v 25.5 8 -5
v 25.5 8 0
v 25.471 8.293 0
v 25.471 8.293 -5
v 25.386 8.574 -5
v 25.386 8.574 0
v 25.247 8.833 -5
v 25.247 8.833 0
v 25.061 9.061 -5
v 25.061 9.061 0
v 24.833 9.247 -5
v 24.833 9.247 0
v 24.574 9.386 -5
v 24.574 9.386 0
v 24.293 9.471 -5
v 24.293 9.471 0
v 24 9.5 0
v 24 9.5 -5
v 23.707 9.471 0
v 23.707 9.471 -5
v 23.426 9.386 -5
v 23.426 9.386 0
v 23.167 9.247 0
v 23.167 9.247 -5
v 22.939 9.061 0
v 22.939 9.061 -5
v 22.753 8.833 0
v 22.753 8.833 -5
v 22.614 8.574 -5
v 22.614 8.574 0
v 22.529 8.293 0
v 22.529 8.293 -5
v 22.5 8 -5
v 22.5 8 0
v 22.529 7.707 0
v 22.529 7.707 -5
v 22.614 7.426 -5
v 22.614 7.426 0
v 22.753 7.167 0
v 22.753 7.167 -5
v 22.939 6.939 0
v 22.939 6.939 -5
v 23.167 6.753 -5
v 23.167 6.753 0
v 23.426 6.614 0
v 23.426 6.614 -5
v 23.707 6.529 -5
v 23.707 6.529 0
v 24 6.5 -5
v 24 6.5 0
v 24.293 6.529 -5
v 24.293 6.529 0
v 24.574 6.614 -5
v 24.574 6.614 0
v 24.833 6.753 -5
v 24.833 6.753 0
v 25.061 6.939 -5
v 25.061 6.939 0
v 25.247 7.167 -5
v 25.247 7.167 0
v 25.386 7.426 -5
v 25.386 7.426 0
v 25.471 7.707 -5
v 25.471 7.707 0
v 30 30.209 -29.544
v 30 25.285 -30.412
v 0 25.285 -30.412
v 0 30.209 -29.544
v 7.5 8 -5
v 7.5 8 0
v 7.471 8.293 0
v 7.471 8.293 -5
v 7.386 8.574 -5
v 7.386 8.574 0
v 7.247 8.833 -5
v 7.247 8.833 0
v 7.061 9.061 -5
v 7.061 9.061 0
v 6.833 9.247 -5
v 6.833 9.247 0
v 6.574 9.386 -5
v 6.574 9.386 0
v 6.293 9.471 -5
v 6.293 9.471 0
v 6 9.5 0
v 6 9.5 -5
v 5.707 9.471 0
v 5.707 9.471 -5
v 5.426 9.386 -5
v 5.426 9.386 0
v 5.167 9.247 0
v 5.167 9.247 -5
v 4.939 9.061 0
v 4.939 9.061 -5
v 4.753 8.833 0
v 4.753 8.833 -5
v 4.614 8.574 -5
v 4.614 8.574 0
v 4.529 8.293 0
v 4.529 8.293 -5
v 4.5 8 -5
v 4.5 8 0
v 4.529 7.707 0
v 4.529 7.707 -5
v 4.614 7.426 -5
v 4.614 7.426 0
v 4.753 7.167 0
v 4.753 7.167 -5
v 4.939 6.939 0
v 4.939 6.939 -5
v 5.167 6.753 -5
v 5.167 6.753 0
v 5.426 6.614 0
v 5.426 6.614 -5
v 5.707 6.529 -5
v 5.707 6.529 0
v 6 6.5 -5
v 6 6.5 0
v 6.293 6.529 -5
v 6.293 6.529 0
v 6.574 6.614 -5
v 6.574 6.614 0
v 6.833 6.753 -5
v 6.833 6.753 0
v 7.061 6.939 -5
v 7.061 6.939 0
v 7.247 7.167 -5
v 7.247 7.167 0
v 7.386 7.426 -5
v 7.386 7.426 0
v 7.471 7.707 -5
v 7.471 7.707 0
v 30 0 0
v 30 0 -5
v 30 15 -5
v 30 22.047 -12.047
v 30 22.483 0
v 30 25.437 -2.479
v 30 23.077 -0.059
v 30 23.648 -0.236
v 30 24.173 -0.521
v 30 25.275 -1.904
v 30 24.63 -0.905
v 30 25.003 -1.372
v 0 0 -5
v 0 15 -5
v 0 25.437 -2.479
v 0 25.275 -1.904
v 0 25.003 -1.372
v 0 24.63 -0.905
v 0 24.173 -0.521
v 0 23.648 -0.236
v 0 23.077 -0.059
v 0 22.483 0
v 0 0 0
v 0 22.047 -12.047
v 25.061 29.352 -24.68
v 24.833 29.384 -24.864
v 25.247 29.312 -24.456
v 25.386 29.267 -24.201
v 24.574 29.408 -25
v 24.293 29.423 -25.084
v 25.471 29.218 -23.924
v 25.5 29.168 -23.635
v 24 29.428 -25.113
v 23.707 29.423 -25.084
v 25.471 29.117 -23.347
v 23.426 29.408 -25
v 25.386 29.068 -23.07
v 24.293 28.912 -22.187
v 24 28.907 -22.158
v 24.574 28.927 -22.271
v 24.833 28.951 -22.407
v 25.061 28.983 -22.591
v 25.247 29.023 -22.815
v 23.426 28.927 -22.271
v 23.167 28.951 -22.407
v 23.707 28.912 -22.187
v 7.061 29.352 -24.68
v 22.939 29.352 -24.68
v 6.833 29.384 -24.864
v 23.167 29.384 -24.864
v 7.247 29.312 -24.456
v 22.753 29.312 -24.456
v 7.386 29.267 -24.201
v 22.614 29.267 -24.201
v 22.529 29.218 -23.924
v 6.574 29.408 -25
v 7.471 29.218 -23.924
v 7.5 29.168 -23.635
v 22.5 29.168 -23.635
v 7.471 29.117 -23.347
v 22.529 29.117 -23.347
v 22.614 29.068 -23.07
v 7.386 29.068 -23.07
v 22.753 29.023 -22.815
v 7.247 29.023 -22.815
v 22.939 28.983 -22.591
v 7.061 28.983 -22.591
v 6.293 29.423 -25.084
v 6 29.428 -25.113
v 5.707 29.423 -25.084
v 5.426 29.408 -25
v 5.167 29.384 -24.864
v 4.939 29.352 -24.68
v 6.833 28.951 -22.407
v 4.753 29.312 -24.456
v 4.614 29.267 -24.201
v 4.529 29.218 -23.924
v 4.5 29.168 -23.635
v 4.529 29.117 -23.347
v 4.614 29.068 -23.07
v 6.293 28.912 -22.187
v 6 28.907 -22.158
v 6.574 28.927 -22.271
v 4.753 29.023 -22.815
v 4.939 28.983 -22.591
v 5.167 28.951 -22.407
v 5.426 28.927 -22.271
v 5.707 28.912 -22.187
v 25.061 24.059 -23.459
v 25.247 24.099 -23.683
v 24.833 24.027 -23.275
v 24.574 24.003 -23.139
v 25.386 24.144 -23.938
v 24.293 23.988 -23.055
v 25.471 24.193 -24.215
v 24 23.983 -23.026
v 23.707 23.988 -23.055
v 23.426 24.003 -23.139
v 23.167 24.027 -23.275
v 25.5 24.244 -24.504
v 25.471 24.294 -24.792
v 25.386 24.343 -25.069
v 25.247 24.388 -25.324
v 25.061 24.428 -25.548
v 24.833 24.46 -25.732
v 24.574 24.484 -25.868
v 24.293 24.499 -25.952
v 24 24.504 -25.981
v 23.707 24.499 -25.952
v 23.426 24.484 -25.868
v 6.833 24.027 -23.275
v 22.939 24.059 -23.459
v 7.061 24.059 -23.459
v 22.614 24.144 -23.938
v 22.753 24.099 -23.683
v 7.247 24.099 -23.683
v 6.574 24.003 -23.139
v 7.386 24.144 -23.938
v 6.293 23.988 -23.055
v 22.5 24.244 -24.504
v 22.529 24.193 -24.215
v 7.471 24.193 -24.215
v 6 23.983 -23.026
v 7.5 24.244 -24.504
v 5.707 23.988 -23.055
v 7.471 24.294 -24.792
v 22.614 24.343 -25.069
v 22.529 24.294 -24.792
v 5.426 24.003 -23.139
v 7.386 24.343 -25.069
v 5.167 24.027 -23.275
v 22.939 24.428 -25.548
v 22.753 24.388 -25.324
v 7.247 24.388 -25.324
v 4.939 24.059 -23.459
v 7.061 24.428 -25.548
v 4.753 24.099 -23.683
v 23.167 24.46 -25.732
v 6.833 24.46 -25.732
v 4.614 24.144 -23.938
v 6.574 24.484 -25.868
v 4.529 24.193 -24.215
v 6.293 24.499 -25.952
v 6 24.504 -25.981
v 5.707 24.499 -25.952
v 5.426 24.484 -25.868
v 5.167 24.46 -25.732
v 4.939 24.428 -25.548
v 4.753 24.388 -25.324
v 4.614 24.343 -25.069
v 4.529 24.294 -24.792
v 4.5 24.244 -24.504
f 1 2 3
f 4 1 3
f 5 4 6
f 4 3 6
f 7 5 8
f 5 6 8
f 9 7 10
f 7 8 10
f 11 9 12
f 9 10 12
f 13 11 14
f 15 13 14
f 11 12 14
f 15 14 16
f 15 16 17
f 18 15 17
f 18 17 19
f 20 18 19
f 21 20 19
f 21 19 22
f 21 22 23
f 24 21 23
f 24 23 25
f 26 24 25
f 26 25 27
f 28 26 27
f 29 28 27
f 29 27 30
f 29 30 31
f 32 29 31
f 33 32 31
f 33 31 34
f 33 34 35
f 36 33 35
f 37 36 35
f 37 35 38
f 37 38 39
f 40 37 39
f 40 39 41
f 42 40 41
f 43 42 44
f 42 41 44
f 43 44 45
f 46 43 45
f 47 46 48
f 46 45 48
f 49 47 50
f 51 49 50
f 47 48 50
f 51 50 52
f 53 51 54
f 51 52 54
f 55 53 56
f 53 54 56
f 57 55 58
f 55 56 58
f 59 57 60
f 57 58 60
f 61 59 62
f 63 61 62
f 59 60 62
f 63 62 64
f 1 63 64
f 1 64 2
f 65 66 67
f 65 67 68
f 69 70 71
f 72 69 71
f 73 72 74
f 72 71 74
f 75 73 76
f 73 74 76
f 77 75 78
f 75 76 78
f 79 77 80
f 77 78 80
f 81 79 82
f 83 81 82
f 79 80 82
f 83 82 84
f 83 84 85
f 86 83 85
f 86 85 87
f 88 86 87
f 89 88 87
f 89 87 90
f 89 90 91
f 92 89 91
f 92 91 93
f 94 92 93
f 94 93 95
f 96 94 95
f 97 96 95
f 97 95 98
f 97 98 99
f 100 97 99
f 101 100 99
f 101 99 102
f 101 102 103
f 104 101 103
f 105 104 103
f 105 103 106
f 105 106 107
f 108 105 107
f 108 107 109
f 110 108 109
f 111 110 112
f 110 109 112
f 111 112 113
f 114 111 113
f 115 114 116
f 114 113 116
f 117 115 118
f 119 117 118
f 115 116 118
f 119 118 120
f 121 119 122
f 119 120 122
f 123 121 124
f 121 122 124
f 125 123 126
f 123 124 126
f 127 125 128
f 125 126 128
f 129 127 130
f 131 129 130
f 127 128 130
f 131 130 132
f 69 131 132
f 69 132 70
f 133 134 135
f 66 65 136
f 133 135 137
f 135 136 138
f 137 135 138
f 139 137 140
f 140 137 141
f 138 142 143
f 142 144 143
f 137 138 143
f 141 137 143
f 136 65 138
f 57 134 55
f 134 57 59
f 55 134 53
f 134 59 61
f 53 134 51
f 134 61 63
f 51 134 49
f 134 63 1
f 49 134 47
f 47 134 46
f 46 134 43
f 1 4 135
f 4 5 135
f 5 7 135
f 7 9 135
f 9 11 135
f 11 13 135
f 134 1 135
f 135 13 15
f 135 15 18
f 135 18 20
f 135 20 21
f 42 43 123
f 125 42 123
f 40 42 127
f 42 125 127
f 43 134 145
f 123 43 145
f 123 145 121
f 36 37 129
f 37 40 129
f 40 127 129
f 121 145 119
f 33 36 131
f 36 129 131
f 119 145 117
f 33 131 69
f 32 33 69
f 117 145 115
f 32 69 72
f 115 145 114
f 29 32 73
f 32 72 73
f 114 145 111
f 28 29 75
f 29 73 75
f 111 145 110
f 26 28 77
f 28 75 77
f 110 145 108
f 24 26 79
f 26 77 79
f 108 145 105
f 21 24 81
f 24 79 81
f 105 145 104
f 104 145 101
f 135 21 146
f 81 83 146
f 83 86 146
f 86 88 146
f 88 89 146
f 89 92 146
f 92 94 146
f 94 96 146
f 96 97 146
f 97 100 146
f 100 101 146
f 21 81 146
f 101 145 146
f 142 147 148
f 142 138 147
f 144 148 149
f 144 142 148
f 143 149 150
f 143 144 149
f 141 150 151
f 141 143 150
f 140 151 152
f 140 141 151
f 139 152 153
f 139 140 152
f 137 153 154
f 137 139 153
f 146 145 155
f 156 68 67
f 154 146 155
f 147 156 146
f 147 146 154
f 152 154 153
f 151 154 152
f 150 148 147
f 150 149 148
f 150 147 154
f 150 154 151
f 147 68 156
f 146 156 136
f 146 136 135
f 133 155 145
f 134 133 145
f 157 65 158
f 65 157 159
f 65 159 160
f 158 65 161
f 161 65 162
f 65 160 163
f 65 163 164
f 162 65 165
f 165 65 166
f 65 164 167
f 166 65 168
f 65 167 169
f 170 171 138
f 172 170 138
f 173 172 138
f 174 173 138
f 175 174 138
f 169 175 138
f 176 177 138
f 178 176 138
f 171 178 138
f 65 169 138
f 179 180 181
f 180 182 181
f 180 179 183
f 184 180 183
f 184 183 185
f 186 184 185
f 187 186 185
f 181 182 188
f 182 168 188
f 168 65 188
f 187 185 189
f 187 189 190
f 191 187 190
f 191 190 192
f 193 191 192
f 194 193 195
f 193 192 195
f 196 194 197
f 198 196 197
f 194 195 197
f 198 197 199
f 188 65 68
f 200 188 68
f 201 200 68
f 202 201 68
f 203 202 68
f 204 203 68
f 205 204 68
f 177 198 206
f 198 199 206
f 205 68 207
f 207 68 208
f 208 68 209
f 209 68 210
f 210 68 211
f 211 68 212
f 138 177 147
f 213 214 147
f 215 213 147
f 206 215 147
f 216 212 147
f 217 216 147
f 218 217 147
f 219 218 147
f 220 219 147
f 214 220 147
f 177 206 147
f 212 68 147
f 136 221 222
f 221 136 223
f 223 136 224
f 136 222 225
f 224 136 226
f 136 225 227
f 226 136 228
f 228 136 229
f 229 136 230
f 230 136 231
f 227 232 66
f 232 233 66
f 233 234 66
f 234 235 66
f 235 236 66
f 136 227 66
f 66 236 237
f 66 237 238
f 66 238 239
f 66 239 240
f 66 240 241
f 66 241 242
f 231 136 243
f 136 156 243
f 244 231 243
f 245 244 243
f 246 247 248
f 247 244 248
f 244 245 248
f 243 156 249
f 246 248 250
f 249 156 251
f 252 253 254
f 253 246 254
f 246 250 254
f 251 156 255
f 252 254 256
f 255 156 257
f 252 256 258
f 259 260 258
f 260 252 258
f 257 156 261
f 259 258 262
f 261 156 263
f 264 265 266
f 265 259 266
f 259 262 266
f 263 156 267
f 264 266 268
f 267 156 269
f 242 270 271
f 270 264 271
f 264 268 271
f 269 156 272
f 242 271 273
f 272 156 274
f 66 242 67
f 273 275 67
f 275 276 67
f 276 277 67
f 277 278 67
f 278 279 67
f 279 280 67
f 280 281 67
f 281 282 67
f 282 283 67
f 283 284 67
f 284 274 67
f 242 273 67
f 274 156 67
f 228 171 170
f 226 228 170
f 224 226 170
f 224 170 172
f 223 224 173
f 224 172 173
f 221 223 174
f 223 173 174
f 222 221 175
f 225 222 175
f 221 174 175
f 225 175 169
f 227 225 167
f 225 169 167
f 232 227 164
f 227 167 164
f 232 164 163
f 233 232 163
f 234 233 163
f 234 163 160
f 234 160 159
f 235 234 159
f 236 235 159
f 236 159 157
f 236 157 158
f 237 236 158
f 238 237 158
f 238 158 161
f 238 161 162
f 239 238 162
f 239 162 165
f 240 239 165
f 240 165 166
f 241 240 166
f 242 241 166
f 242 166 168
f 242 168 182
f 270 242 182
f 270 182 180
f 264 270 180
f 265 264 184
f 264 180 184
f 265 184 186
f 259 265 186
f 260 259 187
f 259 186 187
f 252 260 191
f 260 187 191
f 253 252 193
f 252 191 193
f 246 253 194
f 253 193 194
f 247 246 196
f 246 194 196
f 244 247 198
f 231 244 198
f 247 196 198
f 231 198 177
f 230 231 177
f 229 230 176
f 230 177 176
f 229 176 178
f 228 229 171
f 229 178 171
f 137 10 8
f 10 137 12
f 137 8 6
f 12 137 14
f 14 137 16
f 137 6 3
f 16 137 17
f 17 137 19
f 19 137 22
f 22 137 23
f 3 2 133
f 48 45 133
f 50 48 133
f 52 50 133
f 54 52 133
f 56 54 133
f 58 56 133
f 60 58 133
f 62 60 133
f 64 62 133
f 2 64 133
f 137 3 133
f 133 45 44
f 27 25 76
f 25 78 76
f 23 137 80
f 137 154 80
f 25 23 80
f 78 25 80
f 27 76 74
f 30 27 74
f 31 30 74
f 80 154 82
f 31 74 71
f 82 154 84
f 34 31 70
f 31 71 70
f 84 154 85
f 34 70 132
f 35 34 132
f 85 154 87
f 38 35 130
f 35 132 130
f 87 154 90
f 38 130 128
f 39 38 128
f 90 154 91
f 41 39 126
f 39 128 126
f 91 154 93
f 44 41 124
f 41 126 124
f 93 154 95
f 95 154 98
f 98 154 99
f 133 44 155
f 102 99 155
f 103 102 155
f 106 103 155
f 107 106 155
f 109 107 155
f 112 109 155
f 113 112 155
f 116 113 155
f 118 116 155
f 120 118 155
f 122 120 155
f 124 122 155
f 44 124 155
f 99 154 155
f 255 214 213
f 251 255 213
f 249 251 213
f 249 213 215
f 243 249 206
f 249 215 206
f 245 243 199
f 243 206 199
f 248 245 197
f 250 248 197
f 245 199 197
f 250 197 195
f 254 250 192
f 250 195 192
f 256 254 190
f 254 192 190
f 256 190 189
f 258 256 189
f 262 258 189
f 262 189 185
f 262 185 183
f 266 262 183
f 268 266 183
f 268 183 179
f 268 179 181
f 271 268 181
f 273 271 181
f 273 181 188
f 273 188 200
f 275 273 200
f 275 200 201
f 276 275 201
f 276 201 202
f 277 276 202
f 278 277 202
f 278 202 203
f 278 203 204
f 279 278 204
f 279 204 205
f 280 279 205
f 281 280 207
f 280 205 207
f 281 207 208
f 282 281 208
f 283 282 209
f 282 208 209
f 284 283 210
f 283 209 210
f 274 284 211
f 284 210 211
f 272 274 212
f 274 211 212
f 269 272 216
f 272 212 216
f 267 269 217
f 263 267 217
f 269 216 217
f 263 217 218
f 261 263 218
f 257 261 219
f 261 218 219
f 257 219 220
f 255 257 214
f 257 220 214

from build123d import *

# Parameters (mm, degrees)
EXTRUDE_1_DEPTH     = 30
FILLET_1_R          = 3
SKETCH_2_R          = 1.5
CUT_EXTRUDE_1_DEPTH = 53.32140222
SKETCH_3_R          = 1.5
CUT_EXTRUDE_2_DEPTH = 52.875952527
EXTRUDE_2_DEPTH     = 30


with BuildPart() as part:
    # 草图1 → 凸台-拉伸1 (new body)
    with BuildSketch(Plane(origin=(0, 0, 0), x_dir=(0, 0, -1), z_dir=(1, 0, 0))):
        Polygon((0, 0), (5, 0), (5, 20.804501844), (30.412473479, 25.285406565), (29.54423259, 30.20944533), (0, 25), align=None)
    extrude(amount=EXTRUDE_1_DEPTH)

    # 圆角1
    fillet_1_edges = [part.edges().sort_by_distance(p)[0] for p in [
        (15, 25, 0),
        (15, 20.804501844, -5),
    ]]
    fillet(fillet_1_edges, radius=FILLET_1_R)

    # 草图2 → 切除-拉伸1 (cut, through all)
    with BuildSketch(Plane.XY):
        with Locations((6, 8)):
            Circle(SKETCH_2_R)
        with Locations((24, 8)):
            Circle(SKETCH_2_R)
    extrude(amount=-CUT_EXTRUDE_1_DEPTH, mode=Mode.SUBTRACT)

    # 草图3 → 切除-拉伸2 (cut, through all)
    with BuildSketch(Plane(origin=(0, 24.24615776, 4.275251792), x_dir=(1, 0, 0), z_dir=(0, 0.9848077530122086, 0.1736481776669273))):
        with Locations(Location((6, 28.341204442, 0), (0, 0, 270))):
            Circle(SKETCH_3_R)
        with Locations(Location((24, 28.341204442, 0), (0, 0, 270))):
            Circle(SKETCH_3_R)
    extrude(amount=-CUT_EXTRUDE_2_DEPTH, mode=Mode.SUBTRACT)

    # 草图4 → 凸台-拉伸2 (add)
    with BuildSketch(Plane(origin=(30, 0, 0), x_dir=(0, 0, -1), z_dir=(1, 0, 0))):
        with BuildLine():
            Line((5, 15), (5, 18.287202951))
            ThreePointArc((5, 18.287202951), (5.701866671, 20.21556578), (7.479055467, 21.24162621))
            Line((7.479055467, 21.24162621), (12.047094791, 22.047094791))
            Line((12.047094791, 22.047094791), (5, 15))
        make_face()
    extrude(amount=-EXTRUDE_2_DEPTH)


solid = part.part
